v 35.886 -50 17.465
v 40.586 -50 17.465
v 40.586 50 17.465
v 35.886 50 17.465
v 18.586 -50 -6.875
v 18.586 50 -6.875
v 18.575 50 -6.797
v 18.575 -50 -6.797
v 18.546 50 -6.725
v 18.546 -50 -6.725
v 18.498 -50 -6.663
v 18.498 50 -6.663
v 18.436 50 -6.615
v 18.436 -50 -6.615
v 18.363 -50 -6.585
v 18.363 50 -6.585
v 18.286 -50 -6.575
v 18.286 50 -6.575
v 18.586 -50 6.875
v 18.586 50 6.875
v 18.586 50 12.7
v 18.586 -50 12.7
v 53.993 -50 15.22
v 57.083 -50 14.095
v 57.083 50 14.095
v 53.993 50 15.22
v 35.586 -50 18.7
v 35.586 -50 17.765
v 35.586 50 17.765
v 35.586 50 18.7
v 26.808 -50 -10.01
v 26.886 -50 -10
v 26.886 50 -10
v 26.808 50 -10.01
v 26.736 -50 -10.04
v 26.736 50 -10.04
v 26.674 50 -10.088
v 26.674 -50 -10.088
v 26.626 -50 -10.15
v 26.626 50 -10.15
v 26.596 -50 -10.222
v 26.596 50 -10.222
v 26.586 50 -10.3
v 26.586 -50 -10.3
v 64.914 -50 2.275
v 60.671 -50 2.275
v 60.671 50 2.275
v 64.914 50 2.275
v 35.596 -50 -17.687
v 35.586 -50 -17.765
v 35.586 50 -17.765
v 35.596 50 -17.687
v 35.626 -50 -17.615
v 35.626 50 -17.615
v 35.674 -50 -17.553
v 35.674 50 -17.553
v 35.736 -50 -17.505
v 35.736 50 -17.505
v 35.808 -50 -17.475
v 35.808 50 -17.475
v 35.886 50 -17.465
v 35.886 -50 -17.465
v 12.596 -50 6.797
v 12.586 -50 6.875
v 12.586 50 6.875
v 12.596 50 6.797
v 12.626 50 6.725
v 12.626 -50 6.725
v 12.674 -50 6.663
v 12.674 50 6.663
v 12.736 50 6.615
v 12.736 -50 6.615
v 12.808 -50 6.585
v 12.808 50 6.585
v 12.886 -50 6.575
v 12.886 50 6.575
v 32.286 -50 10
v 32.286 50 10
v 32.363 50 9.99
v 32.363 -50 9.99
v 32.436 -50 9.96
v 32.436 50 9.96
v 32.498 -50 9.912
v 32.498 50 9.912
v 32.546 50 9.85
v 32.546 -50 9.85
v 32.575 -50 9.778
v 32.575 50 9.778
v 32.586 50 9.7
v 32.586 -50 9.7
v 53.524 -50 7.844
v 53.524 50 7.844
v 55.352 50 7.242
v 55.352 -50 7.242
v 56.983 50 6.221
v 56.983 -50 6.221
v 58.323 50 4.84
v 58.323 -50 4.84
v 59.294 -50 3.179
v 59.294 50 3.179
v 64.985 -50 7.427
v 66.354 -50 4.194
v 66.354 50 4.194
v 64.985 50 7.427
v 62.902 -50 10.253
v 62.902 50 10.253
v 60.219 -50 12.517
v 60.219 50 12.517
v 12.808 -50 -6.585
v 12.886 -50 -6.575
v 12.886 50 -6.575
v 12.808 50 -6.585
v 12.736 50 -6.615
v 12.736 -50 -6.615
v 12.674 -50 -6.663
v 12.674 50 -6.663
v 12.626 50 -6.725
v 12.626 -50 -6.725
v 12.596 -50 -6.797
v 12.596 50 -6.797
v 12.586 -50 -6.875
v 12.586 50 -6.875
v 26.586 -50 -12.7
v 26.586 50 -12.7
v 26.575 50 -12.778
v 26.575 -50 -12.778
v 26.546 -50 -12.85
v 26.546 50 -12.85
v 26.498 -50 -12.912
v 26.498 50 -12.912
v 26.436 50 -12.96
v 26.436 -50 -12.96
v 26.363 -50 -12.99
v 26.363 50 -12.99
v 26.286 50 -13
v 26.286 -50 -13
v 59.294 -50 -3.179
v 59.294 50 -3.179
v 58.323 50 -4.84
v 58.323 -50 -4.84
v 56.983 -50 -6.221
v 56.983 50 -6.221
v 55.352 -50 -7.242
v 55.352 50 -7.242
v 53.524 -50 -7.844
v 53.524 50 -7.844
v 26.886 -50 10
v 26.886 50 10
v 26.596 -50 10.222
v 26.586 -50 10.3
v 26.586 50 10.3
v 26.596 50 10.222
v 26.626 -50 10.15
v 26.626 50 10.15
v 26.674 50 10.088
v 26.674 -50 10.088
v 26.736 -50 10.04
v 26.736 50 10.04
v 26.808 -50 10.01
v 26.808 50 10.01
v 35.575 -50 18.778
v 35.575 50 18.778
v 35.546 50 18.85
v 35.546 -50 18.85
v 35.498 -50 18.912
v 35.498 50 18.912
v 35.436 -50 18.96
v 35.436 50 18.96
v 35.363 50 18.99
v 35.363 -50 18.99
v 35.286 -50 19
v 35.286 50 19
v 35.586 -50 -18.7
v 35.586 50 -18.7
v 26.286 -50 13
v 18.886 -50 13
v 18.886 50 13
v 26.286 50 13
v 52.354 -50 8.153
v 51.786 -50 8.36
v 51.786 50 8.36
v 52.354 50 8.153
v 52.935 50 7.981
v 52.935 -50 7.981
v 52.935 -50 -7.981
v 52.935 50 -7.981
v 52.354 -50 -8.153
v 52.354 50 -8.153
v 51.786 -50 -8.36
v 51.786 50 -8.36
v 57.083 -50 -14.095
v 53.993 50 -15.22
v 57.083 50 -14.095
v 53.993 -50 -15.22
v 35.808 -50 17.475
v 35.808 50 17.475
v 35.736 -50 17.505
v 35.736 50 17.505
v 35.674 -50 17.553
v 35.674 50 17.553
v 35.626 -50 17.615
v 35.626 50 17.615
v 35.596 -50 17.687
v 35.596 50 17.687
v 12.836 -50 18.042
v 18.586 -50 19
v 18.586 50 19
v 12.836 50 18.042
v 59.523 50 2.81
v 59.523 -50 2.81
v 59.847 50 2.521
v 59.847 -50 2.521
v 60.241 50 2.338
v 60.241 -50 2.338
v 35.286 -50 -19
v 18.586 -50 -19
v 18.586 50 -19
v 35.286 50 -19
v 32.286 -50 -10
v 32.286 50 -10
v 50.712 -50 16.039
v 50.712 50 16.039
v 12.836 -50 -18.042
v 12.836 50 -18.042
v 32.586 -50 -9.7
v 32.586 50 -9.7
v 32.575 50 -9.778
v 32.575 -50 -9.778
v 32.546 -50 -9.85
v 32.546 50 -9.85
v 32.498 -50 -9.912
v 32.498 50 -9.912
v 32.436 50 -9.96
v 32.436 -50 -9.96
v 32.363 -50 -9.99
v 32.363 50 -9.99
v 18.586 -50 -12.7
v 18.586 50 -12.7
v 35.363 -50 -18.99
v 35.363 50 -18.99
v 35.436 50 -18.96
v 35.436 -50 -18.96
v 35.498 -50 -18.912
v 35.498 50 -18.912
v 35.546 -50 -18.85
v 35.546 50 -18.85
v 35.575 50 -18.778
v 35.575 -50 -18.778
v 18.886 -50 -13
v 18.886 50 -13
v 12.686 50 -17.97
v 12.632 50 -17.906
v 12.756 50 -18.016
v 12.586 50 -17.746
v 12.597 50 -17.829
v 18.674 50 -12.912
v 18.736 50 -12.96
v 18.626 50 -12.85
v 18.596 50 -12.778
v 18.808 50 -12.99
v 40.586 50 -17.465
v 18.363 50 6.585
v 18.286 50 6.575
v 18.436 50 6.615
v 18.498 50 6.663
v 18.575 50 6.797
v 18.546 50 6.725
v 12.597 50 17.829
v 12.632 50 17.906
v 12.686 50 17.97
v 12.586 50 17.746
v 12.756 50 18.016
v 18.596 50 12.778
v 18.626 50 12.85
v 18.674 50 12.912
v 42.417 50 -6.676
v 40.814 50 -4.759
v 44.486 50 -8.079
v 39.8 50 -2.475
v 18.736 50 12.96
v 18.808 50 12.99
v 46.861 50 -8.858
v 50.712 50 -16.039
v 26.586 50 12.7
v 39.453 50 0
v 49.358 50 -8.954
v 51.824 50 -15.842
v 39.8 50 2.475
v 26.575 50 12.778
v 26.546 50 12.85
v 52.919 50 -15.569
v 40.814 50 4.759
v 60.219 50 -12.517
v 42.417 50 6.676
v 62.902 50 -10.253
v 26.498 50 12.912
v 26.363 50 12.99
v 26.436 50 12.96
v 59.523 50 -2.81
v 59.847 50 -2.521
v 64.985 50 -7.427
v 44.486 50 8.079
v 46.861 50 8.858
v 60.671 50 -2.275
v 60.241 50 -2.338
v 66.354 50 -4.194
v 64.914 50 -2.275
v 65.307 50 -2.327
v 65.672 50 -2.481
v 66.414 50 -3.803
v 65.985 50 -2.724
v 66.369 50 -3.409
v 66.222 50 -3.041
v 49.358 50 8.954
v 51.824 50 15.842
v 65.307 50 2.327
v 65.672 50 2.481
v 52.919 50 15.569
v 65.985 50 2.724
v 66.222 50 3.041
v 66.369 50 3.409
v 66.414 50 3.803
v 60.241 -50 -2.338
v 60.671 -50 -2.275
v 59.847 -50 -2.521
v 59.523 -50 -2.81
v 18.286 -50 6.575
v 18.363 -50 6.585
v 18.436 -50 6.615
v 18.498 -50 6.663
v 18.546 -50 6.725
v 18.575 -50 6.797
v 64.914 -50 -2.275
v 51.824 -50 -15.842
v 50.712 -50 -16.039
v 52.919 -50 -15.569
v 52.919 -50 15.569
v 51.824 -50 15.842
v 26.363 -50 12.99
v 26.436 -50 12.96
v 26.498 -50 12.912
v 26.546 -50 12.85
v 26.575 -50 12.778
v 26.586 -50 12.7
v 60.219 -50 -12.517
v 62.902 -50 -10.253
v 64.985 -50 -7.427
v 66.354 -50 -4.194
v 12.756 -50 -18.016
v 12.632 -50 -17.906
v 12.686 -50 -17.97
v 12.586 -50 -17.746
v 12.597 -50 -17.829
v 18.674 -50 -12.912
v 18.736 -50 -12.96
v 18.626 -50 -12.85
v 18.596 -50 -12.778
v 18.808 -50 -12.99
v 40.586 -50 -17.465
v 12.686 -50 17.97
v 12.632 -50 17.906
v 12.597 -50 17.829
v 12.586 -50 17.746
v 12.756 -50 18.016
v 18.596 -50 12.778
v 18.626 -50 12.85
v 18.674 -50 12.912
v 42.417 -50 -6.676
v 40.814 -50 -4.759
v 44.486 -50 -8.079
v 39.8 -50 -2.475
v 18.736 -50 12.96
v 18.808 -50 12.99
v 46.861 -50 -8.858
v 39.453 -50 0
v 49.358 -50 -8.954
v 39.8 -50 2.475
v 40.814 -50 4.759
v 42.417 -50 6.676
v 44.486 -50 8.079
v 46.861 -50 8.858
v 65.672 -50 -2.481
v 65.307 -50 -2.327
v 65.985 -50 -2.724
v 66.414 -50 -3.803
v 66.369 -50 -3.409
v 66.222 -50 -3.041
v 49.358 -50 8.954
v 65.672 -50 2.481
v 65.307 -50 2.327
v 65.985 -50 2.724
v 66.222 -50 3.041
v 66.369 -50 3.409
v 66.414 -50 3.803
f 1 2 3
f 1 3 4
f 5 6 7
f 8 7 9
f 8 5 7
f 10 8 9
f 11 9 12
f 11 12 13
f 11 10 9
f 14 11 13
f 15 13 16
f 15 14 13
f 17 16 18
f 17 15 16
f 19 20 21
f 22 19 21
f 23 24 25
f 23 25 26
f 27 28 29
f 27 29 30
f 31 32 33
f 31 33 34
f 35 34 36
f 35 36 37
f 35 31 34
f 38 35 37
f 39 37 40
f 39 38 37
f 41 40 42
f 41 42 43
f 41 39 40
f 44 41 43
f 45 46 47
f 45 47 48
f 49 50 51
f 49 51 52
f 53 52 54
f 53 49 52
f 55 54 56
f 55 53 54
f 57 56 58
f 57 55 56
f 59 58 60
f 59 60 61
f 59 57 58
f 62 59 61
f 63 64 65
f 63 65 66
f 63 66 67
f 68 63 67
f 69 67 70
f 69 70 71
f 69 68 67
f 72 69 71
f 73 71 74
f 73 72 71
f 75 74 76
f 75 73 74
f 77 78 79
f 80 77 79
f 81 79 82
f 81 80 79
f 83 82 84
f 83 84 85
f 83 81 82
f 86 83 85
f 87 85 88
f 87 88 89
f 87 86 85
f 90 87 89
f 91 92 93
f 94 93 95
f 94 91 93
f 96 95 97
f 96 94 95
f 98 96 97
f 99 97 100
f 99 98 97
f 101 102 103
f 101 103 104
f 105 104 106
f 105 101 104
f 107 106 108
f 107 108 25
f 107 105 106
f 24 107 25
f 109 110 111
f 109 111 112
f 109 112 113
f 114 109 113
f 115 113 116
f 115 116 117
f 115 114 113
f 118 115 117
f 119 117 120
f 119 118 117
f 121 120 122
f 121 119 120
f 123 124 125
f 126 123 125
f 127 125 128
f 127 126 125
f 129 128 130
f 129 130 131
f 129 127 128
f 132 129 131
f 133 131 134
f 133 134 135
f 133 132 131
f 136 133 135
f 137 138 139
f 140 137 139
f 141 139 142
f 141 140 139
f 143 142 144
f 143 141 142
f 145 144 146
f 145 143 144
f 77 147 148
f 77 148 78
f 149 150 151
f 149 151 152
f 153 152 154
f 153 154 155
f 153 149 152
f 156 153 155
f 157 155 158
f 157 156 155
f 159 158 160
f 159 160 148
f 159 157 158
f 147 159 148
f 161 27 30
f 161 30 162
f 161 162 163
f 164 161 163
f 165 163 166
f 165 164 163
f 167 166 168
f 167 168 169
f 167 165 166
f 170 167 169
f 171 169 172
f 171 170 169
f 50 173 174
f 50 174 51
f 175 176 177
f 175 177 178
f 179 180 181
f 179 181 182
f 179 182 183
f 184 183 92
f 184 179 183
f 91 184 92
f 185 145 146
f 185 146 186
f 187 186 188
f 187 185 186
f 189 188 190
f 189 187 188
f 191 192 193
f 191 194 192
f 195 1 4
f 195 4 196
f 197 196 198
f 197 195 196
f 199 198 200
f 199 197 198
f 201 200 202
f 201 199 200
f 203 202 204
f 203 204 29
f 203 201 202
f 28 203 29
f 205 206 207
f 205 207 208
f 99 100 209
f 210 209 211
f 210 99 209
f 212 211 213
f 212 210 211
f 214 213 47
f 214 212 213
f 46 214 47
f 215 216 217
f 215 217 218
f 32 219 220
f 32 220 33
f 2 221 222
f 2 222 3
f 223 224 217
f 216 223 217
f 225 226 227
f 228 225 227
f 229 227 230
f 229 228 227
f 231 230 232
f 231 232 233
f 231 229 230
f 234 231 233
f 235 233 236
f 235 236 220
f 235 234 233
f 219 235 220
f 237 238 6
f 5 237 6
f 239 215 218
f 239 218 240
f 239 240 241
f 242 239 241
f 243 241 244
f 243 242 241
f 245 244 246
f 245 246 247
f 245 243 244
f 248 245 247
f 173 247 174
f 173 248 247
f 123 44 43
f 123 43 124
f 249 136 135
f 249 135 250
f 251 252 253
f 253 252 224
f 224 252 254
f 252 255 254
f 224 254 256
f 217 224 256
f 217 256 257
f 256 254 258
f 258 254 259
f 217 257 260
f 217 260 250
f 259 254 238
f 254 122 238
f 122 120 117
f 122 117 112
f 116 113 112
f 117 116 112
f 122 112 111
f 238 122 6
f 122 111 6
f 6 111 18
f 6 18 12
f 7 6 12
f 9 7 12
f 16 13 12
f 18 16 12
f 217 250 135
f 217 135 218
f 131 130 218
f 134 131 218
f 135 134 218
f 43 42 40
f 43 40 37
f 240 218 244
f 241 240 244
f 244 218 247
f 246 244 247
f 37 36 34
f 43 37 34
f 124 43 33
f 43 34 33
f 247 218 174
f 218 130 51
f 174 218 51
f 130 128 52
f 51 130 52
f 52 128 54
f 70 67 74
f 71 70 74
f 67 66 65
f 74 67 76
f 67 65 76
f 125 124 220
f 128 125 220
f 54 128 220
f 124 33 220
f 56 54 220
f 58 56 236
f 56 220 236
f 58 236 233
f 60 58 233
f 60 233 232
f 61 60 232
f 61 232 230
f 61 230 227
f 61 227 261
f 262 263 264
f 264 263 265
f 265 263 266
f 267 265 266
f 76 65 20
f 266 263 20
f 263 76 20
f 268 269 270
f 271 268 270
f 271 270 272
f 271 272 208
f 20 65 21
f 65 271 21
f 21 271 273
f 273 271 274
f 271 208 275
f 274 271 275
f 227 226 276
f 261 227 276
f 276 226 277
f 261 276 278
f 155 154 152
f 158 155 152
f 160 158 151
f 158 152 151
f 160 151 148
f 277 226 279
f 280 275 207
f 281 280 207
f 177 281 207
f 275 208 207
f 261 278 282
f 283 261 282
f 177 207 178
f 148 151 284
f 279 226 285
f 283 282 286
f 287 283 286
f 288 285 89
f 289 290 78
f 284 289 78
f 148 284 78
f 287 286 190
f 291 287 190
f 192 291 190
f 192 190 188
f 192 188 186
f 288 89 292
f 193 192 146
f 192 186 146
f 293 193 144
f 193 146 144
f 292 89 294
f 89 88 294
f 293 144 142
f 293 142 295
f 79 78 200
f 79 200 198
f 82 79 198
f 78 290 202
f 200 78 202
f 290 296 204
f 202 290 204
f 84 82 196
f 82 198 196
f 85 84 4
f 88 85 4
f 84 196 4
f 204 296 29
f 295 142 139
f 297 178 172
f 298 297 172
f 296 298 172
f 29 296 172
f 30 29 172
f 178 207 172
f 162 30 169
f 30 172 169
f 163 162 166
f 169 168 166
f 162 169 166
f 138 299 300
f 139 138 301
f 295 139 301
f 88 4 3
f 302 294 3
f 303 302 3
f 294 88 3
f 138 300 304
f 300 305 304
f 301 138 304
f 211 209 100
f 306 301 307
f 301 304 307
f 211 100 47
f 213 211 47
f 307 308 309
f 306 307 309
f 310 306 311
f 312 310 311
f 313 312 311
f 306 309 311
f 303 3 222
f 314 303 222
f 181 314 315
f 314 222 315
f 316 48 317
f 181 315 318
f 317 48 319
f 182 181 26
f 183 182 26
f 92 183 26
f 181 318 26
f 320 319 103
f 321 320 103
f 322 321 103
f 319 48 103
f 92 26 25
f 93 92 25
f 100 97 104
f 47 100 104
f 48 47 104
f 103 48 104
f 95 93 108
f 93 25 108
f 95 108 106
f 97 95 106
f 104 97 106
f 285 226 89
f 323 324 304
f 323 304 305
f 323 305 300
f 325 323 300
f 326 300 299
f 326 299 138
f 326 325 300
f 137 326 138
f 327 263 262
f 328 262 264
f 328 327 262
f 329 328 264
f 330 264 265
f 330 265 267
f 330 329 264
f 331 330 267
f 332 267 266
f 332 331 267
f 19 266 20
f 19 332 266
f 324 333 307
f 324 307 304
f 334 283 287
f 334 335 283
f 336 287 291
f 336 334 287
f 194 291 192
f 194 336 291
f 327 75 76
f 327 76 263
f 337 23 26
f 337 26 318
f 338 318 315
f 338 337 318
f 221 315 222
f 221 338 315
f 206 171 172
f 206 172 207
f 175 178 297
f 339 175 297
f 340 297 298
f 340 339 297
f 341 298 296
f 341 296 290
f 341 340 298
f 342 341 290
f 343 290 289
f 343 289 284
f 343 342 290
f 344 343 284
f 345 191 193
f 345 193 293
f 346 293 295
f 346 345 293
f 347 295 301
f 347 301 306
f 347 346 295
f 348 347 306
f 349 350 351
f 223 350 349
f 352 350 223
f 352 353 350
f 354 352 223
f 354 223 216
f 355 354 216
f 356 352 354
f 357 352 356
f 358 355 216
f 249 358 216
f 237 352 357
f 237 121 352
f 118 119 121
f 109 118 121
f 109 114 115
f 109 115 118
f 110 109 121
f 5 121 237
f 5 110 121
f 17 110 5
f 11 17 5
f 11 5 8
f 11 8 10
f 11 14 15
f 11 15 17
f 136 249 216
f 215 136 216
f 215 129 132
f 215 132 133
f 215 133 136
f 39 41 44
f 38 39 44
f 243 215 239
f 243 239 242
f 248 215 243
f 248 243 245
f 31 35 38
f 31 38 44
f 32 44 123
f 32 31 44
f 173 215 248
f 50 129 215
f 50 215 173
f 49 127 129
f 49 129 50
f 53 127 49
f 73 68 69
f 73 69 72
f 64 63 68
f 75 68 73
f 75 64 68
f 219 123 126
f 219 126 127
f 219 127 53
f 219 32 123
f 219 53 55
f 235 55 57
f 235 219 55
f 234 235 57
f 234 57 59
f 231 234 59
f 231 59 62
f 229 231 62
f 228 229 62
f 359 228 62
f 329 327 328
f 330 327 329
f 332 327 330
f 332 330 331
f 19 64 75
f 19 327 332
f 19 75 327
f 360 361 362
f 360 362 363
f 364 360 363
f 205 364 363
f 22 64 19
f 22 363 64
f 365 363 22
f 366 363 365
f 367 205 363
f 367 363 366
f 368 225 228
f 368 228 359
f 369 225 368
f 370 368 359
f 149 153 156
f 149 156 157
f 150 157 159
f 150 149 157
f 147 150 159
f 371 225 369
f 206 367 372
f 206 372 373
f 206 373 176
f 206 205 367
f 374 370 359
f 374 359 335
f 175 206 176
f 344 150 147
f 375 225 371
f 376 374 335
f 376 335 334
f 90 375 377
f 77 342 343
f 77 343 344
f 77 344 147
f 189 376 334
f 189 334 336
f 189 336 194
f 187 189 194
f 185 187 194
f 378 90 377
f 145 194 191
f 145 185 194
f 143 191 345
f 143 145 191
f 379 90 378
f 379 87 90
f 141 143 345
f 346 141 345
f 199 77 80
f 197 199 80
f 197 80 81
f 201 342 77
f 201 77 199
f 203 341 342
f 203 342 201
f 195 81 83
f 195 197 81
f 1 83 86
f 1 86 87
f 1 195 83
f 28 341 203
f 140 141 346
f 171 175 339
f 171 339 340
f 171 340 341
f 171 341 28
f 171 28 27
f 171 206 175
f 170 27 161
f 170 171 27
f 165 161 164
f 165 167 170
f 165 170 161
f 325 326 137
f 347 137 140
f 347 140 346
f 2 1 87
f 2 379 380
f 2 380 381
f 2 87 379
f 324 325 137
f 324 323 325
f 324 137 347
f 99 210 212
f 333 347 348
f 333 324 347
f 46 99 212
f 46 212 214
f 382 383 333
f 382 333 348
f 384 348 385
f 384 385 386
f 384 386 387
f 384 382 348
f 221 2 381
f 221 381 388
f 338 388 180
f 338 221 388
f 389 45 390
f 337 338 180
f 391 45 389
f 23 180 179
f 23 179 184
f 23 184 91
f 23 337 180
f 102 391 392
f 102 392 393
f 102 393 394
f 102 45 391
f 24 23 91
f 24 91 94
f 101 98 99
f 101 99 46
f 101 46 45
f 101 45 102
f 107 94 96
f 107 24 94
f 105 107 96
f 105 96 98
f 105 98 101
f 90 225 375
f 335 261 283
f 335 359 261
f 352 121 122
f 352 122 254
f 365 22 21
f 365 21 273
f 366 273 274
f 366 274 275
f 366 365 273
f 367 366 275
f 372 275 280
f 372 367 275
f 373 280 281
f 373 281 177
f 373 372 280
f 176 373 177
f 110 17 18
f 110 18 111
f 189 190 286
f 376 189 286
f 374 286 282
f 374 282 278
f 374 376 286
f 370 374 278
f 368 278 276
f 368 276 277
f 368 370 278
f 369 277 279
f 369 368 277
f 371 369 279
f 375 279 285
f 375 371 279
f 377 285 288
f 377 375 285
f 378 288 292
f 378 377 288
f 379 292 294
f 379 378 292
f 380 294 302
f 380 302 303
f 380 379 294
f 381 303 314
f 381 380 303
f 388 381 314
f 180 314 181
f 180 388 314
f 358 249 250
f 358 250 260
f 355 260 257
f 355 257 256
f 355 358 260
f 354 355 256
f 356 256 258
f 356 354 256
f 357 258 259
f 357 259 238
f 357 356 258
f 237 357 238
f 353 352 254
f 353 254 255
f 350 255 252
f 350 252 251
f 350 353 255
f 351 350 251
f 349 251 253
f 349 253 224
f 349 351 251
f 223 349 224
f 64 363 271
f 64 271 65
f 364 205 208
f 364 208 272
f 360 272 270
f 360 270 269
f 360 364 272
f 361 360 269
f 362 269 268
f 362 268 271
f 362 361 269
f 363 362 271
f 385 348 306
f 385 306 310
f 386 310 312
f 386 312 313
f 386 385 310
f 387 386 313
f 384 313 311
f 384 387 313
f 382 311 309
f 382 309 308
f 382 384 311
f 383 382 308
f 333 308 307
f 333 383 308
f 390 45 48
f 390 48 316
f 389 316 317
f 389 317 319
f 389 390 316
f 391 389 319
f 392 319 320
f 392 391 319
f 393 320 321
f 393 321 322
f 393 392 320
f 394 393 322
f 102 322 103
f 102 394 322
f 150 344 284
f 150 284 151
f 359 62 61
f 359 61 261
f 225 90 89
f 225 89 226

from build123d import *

# Parameters (mm, degrees)
F1_DEPTH = 50


# Not quite as in the source:
# - ends of sketch curves that miss each other by under 0.0002 mm in the source are joined


with BuildPart() as f1:
    # F0 (on Front) → F1 (new body, symmetric)
    with BuildSketch(Plane.XZ):
        with BuildLine():
            Line((53.992555, -15.220268), (57.083133, -14.095389))
            ThreePointArc((57.083133, -14.095389), (62.9018568836, -10.252747544), (66.3544503107, -4.1944440905))
            ThreePointArc((66.3544503107, -4.1944440905), (66.1141142416, -2.8747683688), (64.914288, -2.275))
            Line((64.914288, -2.275), (60.670593, -2.275))
            ThreePointArc((60.670593, -2.275), (59.8472095147, -2.5211899521), (59.2941043505, -3.1789471518))
            ThreePointArc((59.2941043505, -3.1789471518), (56.9827494729, -6.2209259886), (53.52425904, -7.8441451998))
            ThreePointArc((53.52425904, -7.8441451998), (52.6431740995, -8.0626756758), (51.7855370008, -8.3602070021))
            ThreePointArc((51.7855370008, -8.3602070021), (39.452831, 0), (51.7855371982, 8.3602074972))
            ThreePointArc((51.7855371982, 8.3602074972), (52.6431743712, 8.0626765952), (53.524259133, 7.844145664))
            ThreePointArc((53.524259133, 7.844145664), (56.9827494729, 6.2209259886), (59.2941043849, 3.1789471667))
            ThreePointArc((59.2941043849, 3.1789471667), (59.8472095147, 2.5211899521), (60.670593, 2.275))
            Line((60.670593, 2.275), (64.914288, 2.275))
            ThreePointArc((64.914288, 2.275), (66.1141145297, 2.8747687527), (66.3544497778, 4.1944449353))
            ThreePointArc((66.3544497778, 4.1944449353), (62.9018565554, 10.2527478944), (57.0831331177, 14.0953893235))
            Line((57.0831331177, 14.0953893235), (53.992555, 15.220268))
            ThreePointArc((53.992555, 15.220268), (52.3736165632, 15.715360306), (50.7118440801, 16.0387645685))
            Line((50.7118440801, 16.0387645685), (40.585713, 17.465))
            Line((40.585713, 17.465), (35.885713, 17.465))
            ThreePointArc((35.885713, 17.465), (35.6735809656, 17.5528679656), (35.585713, 17.765))
            Line((35.585713, 17.765), (35.585713, 18.7))
            ThreePointArc((35.585713, 18.7), (35.4978450344, 18.9121320344), (35.285713, 19))
            Line((35.285713, 19), (18.585713, 19))
            Line((18.585713, 19), (12.836393, 18.04178))
            ThreePointArc((12.836393, 18.04178), (12.656806899, 17.9397743434), (12.585713, 17.745862))
            Line((12.585713, 17.745862), (12.585713, 6.875))
            ThreePointArc((12.585713, 6.875), (12.6735809656, 6.6628679656), (12.885713, 6.575))
            Line((12.885713, 6.575), (18.285713, 6.575))
            ThreePointArc((18.285713, 6.575), (18.4978450344, 6.6628679656), (18.585713, 6.875))
            Line((18.585713, 6.875), (18.585713, 12.7))
            ThreePointArc((18.585713, 12.7), (18.6735809656, 12.9121320344), (18.885713, 13))
            Line((18.885713, 13), (26.285713, 13))
            ThreePointArc((26.285713, 13), (26.4978450344, 12.9121320344), (26.585713, 12.7))
            Line((26.585713, 12.7), (26.585713, 10.3))
            ThreePointArc((26.585713, 10.3), (26.6735809656, 10.0878679656), (26.885713, 10))
            Line((26.885713, 10), (32.285713, 10))
            ThreePointArc((32.285713, 10), (32.4978450344, 9.9121320344), (32.585713, 9.7))
            Line((32.585713, 9.7), (32.585713, -9.7))
            ThreePointArc((32.585713, -9.7), (32.4978450344, -9.9121320344), (32.285713, -10))
            Line((32.285713, -10), (26.885713, -10))
            ThreePointArc((26.885713, -10), (26.6735809656, -10.0878679656), (26.585713, -10.3))
            Line((26.585713, -10.3), (26.585713, -12.7))
            ThreePointArc((26.585713, -12.7), (26.4978450344, -12.9121320344), (26.285713, -13))
            Line((26.285713, -13), (18.885713, -13))
            ThreePointArc((18.885713, -13), (18.6735809656, -12.9121320344), (18.585713, -12.7))
            Line((18.585713, -12.7), (18.585713, -6.875))
            ThreePointArc((18.585713, -6.875), (18.4978450344, -6.6628679656), (18.285713, -6.575))
            Line((18.285713, -6.575), (12.885713, -6.575))
            ThreePointArc((12.885713, -6.575), (12.6735809656, -6.6628679656), (12.585713, -6.875))
            Line((12.585713, -6.875), (12.585713, -17.745862))
            ThreePointArc((12.585713, -17.745862), (12.656806899, -17.9397743434), (12.8363929795, -18.0417801231))
            Line((12.8363929795, -18.0417801231), (18.585713, -19))
            Line((18.585713, -19), (35.285713, -19))
            ThreePointArc((35.285713, -19), (35.4978450344, -18.9121320344), (35.585713, -18.7))
            Line((35.585713, -18.7), (35.585713, -17.765))
            ThreePointArc((35.585713, -17.765), (35.6735809656, -17.5528679656), (35.885713, -17.465))
            Line((35.885713, -17.465), (40.585713, -17.465))
            Line((40.585713, -17.465), (50.711844, -16.038764))
            ThreePointArc((50.711844, -16.038764), (52.3736165632, -15.715360306), (53.992555, -15.220268))
        make_face()
    extrude(amount=F1_DEPTH, both=True)


solid = f1.part
